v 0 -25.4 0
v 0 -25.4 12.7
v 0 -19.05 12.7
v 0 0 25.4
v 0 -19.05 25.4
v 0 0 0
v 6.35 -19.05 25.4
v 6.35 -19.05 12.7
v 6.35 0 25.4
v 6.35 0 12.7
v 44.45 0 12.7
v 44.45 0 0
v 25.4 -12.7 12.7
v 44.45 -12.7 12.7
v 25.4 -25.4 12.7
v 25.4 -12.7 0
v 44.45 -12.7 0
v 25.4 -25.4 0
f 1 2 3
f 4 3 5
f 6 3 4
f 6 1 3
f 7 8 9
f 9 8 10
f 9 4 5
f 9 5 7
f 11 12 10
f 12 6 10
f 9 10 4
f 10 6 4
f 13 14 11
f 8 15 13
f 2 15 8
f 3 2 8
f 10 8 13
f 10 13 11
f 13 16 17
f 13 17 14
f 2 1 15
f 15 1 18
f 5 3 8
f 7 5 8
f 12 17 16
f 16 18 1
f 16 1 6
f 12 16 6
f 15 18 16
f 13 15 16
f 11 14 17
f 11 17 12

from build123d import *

# Parameters (mm, degrees)
F0_W     = 25.4
F0_H     = 25.4
F1_DEPTH = 12.7
F2_W     = 6.35
F2_H     = 19.05
F3_DEPTH = 12.7
F4_W     = 12.7
F4_H     = 12.7
F5_DEPTH = 19.05


with BuildPart() as f1:
    # F0 (on Top) → F1 (new body)
    with BuildSketch(Plane.XY):
        with Locations((12.7, -12.7)):
            Rectangle(F0_W, F0_H)
    extrude(amount=F1_DEPTH)

    # F2 (on face) → F3 (join)
    with BuildSketch(Plane.XY.offset(12.7)):
        with Locations((3.175, -9.525)):
            Rectangle(F2_W, F2_H)
    extrude(amount=F3_DEPTH)

    # F4 (on face) → F5 (join)
    with BuildSketch(Plane.YZ.offset(25.4)):
        with Locations((-6.35, 6.35)):
            Rectangle(F4_W, F4_H)
    extrude(amount=F5_DEPTH)


solid = f1.part
